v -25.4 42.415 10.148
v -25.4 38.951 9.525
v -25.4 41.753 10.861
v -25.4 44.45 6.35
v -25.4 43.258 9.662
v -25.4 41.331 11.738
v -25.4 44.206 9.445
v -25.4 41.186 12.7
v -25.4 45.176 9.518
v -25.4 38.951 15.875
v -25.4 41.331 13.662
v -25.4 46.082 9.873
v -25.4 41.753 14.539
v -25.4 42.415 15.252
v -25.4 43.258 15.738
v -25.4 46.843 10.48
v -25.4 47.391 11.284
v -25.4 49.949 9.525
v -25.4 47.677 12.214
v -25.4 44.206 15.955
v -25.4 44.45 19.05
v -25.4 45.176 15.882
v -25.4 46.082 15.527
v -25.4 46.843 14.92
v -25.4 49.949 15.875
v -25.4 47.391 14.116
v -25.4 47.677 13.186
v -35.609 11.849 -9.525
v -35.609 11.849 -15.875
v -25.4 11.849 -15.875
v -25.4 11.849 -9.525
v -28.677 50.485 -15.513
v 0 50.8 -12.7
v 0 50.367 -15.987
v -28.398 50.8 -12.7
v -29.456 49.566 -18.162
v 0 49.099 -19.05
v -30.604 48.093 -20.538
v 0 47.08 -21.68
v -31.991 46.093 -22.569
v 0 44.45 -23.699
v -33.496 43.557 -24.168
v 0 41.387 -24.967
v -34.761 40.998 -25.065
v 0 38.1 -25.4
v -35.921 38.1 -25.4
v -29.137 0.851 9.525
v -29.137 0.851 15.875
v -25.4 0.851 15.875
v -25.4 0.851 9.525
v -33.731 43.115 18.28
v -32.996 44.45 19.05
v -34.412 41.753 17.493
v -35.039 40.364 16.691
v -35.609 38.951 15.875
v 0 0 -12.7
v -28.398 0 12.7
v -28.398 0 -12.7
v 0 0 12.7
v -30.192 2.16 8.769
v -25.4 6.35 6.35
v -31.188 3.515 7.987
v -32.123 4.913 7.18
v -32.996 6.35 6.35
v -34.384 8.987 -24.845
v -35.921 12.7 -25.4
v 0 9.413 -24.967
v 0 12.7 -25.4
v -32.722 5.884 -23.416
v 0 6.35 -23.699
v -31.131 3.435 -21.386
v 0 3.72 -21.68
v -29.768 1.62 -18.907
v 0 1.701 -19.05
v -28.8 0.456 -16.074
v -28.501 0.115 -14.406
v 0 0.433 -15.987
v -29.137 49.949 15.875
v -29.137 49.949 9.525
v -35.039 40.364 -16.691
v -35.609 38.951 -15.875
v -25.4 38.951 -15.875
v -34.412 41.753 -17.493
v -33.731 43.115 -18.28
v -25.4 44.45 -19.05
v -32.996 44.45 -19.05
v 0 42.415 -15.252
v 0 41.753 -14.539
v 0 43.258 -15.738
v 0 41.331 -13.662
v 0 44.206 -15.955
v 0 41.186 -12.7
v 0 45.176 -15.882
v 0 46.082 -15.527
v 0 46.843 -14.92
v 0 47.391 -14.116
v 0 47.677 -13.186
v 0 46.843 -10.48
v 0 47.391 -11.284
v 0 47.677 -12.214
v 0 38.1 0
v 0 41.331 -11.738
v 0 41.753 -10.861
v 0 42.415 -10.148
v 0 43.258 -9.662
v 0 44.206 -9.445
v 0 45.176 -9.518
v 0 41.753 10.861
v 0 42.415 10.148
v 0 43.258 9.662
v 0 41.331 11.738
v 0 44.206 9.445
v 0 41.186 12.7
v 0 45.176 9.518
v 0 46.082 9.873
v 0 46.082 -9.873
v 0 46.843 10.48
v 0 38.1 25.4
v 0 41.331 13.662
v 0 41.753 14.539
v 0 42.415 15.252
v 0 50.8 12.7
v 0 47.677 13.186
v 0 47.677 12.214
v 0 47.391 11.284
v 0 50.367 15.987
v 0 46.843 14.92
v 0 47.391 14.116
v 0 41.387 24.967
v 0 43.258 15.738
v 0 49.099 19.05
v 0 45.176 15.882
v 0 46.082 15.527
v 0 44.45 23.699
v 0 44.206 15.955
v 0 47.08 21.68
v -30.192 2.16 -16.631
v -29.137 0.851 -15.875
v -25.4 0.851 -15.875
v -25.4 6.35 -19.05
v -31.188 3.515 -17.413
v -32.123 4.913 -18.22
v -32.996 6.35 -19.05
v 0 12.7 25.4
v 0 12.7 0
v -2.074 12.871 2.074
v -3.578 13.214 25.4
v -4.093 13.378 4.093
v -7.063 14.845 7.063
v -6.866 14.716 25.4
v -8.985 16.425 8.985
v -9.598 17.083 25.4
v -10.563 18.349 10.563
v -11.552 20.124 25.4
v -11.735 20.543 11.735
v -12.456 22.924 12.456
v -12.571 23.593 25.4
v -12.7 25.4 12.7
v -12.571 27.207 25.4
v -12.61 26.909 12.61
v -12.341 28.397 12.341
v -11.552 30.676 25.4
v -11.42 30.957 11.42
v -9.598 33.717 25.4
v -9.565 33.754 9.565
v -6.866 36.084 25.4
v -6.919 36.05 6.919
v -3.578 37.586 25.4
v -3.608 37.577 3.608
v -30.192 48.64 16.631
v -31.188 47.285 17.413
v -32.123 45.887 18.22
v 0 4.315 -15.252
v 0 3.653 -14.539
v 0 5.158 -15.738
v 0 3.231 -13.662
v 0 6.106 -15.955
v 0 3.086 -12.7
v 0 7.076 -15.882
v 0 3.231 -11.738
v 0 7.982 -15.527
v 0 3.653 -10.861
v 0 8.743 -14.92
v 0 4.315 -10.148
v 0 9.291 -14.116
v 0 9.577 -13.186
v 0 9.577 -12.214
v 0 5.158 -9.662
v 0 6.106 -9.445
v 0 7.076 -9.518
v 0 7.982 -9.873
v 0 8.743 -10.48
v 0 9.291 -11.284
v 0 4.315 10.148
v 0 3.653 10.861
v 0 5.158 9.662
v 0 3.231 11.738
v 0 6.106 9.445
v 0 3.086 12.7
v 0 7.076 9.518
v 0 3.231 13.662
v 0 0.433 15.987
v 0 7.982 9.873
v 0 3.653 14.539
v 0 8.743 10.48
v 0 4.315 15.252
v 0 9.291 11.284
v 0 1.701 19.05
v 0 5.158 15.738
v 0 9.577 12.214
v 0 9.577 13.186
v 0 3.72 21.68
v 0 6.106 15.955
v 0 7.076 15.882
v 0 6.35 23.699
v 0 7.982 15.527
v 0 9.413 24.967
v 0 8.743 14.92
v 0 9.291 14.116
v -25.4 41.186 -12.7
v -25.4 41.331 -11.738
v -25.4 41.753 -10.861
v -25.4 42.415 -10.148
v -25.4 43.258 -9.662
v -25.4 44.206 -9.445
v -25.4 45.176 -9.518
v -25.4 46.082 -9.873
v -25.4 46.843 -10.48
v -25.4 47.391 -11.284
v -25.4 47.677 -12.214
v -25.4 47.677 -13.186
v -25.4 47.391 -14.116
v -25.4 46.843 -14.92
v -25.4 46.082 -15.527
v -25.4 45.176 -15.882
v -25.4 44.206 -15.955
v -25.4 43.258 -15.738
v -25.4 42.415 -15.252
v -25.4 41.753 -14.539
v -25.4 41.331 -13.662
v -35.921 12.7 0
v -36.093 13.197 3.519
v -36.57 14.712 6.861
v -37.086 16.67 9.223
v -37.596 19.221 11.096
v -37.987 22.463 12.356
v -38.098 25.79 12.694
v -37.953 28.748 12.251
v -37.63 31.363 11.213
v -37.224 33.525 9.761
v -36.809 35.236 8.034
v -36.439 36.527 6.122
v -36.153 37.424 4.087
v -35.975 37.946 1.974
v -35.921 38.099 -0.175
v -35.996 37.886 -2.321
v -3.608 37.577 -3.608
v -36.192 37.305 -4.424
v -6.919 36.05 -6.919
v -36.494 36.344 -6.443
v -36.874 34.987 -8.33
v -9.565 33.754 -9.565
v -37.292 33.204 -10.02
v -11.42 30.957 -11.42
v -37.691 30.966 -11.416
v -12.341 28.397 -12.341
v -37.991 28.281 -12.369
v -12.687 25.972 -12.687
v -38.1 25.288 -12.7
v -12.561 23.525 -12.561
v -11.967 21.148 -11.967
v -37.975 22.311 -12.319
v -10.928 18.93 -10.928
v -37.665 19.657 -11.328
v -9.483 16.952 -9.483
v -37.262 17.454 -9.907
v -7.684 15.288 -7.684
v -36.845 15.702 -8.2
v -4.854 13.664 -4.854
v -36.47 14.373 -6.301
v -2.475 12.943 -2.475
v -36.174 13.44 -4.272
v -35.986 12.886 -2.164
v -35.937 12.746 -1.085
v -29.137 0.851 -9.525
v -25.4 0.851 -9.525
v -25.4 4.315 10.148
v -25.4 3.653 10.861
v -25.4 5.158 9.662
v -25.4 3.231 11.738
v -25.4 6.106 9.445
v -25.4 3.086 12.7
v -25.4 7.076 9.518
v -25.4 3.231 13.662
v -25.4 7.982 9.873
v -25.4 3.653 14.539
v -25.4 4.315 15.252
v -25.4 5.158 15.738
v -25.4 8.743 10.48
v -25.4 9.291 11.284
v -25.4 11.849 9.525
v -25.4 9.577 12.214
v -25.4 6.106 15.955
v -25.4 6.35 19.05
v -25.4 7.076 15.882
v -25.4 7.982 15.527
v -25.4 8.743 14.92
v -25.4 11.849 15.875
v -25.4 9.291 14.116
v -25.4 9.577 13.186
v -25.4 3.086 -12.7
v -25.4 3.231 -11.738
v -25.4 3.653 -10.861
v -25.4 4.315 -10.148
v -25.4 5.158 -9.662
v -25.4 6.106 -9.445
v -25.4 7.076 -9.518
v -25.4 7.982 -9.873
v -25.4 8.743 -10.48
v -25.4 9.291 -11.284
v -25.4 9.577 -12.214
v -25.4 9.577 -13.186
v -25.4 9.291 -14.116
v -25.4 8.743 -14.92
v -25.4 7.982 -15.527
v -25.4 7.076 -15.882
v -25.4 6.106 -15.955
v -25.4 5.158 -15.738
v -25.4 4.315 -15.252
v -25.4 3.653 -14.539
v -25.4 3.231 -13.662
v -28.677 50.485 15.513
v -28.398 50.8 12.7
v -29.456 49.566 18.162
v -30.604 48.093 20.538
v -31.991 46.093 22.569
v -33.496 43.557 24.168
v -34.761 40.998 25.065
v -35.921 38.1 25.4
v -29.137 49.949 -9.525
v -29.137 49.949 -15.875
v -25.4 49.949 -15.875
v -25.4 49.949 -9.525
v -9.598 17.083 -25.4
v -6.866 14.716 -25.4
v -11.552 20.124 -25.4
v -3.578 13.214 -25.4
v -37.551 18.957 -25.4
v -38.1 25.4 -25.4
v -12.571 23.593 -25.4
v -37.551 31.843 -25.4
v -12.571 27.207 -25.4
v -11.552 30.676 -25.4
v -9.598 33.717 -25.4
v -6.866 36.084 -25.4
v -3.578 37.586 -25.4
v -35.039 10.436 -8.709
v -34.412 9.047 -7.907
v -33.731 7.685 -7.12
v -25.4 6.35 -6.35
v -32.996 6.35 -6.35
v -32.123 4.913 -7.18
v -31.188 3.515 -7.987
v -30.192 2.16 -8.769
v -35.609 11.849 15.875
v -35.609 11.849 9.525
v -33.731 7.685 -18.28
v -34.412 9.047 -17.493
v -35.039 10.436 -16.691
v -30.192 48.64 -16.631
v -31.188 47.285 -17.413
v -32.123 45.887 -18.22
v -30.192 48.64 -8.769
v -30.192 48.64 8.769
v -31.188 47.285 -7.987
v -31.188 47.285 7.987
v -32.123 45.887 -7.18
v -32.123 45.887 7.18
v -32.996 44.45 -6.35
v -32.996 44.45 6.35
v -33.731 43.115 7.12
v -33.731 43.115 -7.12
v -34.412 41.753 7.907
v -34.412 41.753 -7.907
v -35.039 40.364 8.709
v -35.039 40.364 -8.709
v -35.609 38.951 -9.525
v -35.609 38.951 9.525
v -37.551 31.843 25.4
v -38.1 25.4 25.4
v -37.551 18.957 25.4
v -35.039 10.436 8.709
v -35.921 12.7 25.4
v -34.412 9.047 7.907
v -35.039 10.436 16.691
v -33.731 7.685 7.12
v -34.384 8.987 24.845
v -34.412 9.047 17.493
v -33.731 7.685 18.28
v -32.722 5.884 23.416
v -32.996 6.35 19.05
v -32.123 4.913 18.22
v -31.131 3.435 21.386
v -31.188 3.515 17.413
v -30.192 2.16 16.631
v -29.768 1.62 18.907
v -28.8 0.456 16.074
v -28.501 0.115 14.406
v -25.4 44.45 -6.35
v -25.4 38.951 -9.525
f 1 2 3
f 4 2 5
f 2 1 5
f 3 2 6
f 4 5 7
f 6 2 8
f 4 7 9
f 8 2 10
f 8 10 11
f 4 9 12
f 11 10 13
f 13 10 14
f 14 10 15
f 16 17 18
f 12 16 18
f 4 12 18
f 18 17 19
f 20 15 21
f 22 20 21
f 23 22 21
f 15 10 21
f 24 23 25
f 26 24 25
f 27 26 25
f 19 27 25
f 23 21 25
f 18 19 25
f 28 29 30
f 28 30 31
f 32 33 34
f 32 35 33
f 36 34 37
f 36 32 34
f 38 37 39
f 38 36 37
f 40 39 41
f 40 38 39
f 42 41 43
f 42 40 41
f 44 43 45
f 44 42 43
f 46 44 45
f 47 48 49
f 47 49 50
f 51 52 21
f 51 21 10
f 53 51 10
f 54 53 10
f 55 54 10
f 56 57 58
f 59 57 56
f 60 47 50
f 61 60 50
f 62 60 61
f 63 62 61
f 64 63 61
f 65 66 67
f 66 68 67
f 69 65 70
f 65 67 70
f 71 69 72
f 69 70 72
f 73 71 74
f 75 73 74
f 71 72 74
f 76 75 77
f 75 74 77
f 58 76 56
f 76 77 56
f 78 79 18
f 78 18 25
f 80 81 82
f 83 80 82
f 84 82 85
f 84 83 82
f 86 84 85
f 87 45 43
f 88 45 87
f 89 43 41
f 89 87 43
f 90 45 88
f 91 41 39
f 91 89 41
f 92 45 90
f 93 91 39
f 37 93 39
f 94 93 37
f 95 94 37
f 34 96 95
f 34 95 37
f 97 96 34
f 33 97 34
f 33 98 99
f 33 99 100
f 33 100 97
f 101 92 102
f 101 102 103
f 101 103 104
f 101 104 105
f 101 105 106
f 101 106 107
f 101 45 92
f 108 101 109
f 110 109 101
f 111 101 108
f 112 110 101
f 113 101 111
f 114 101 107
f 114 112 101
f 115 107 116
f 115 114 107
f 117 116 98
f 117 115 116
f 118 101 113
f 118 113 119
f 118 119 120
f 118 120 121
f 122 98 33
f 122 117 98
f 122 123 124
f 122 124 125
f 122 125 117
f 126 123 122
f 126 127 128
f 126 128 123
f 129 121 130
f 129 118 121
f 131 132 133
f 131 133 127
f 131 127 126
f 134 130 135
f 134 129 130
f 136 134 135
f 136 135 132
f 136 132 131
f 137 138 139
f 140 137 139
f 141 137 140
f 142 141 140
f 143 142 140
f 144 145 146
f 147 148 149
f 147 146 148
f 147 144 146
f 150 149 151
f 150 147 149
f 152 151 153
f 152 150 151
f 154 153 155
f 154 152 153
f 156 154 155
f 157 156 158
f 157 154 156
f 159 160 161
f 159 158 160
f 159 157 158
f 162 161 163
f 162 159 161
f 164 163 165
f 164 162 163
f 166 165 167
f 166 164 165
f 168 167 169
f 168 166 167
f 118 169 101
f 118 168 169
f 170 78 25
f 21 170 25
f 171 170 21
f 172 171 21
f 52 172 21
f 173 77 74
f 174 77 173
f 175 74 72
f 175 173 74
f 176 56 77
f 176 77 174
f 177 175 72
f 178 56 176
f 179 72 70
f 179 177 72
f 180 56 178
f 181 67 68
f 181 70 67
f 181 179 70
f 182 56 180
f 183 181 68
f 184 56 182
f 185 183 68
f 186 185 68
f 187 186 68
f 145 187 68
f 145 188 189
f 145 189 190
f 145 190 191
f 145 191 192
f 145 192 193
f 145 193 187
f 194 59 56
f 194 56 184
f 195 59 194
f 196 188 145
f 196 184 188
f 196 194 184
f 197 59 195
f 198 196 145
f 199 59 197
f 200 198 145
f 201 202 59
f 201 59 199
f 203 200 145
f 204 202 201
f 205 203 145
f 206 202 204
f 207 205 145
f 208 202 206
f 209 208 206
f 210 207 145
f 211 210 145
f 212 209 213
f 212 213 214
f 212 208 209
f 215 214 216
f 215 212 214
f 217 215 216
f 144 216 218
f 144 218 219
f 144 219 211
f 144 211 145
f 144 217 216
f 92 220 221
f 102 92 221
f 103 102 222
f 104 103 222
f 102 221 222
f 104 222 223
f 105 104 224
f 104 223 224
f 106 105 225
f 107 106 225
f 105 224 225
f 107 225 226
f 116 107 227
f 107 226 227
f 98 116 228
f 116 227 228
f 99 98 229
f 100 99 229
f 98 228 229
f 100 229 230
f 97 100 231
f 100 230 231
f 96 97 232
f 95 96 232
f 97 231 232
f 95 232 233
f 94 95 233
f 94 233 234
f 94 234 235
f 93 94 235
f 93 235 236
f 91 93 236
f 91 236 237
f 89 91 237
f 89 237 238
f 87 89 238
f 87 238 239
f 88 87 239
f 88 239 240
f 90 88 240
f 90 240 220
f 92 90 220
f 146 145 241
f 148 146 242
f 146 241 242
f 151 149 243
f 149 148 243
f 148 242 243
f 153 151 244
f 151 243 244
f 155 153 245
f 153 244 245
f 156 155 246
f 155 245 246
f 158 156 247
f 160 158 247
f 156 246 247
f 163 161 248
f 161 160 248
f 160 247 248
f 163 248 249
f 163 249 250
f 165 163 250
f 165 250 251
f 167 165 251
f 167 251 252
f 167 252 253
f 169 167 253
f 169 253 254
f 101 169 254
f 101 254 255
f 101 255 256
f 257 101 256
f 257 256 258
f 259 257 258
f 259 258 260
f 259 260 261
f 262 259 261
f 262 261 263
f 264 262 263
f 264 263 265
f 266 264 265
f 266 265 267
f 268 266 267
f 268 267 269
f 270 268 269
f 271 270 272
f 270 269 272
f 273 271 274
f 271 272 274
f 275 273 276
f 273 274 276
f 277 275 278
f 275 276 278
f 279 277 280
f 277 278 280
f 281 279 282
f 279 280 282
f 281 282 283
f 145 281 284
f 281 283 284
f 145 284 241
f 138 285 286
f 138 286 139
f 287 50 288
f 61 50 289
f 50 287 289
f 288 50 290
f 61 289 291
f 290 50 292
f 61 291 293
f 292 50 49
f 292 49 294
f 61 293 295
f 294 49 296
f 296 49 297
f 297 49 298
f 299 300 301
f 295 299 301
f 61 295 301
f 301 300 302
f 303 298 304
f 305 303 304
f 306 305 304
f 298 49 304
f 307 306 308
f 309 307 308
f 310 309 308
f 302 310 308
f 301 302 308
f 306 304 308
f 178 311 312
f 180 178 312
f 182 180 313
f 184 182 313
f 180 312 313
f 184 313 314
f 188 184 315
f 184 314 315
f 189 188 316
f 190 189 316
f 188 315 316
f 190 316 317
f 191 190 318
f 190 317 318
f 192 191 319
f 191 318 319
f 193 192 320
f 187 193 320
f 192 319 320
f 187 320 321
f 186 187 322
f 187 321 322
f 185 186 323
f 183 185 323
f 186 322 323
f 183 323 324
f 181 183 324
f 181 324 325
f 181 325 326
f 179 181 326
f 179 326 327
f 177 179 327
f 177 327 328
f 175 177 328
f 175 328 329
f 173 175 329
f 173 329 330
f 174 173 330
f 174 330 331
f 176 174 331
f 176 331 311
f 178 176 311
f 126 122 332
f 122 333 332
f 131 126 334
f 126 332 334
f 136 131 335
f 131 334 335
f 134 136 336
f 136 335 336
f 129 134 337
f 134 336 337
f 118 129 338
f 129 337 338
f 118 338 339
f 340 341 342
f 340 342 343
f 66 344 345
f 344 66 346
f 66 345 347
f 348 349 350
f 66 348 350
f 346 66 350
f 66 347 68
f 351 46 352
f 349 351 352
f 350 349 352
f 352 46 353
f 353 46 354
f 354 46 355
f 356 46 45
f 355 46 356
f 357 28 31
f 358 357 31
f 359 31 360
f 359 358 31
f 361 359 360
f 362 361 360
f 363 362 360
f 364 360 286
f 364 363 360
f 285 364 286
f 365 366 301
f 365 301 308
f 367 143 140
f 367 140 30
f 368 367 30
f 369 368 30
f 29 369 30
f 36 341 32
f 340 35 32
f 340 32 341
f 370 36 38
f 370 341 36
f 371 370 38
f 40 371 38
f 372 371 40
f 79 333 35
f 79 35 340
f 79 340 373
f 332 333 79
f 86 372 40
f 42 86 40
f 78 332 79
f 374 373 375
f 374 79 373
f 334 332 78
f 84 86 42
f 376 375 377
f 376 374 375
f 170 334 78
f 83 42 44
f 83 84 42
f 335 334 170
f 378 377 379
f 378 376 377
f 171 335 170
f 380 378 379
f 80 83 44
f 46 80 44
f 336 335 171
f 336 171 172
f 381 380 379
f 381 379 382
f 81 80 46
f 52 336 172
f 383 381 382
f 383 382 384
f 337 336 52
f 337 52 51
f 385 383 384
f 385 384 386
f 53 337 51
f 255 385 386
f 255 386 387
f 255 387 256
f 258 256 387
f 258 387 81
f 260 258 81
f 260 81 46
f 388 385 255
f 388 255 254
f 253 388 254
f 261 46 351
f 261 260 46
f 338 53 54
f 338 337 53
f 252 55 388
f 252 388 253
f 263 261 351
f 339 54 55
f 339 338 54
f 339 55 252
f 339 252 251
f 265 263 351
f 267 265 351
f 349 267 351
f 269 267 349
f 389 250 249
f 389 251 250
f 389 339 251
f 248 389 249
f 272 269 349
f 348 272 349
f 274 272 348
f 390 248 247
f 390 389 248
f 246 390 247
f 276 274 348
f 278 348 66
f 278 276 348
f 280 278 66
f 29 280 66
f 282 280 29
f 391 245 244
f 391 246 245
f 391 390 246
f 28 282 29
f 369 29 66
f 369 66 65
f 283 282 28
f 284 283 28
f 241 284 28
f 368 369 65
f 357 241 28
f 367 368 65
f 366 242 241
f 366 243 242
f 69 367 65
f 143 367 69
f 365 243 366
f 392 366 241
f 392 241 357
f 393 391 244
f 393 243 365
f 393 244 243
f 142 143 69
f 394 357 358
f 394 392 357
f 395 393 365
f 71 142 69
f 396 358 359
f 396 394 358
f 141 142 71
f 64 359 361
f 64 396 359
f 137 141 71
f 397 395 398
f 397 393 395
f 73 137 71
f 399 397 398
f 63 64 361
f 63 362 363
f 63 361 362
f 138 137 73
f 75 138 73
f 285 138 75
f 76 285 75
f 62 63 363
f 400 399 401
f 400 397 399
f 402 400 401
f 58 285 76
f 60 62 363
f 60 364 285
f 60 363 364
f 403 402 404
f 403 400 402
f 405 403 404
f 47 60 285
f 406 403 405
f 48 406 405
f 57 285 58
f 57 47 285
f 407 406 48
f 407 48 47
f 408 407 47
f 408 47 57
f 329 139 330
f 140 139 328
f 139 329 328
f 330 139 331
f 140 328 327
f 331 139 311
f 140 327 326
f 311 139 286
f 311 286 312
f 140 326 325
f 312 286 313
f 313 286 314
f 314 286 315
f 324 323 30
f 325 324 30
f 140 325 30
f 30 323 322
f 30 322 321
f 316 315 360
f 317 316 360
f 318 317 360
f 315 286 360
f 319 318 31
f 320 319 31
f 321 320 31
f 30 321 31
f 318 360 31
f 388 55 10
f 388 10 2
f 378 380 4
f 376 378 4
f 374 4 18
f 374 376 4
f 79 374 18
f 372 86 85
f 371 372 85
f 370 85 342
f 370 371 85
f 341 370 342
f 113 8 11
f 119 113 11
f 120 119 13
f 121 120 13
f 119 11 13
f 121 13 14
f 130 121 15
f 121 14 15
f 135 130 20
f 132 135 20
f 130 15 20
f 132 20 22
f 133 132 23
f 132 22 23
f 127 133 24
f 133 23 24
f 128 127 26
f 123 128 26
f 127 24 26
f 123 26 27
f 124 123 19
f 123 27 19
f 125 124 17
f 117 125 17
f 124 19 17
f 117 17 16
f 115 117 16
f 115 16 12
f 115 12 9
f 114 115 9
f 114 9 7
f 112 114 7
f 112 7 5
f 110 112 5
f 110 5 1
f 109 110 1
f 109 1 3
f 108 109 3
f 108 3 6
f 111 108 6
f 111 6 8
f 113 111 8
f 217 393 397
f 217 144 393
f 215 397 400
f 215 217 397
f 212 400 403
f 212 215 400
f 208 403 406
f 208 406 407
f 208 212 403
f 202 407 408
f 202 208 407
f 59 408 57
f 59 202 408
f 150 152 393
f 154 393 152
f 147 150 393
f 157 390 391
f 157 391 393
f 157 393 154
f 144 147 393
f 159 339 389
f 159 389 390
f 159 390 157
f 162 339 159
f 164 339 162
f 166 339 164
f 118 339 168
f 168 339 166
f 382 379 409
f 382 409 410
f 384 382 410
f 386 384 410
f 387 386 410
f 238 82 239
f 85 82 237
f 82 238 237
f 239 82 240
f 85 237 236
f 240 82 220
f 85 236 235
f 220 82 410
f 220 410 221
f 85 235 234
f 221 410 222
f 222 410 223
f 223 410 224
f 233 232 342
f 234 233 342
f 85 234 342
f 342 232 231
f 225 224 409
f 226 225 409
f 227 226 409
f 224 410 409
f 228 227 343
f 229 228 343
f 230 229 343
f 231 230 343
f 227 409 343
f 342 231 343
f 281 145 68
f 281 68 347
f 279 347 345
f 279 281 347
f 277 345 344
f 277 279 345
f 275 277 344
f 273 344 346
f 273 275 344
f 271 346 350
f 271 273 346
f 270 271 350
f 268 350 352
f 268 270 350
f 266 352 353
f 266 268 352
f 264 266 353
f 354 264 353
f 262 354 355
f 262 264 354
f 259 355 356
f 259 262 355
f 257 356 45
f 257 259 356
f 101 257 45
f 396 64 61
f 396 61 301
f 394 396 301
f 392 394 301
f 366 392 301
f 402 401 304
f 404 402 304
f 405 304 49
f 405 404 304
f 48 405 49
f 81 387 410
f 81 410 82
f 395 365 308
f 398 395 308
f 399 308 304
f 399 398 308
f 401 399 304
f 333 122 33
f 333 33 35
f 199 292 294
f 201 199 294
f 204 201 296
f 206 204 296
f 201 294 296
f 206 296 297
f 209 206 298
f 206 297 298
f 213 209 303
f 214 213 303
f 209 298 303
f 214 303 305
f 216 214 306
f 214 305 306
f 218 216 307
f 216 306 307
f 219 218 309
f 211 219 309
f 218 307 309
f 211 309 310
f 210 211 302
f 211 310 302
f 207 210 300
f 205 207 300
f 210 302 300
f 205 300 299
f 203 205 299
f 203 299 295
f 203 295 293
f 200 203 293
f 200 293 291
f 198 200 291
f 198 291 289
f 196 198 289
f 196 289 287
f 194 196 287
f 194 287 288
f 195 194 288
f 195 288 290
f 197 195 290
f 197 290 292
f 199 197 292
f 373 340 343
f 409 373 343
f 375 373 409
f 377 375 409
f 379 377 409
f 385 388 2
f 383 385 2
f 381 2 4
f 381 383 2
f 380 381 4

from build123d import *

# Parameters (mm, degrees)
F1_DEPTH = 25.4
F3_D     = 6.5278
F7_DEPTH = 12.7
F8_R     = 12.7
F9_D     = 25.4


with BuildPart() as f1:
    # F0 (on Top) → F1 (new body, symmetric)
    with BuildSketch(Plane.XY):
        with BuildLine():
            Line((0, 50.8), (-28.3980633142, 50.8))
            ThreePointArc((-28.3980633142, 50.8), (-38.1, 25.4), (-28.3980633142, 0))
            Line((-28.3980633142, 0), (0, 0))
            Line((0, 0), (0, 12.7))
            ThreePointArc((0, 12.7), (-12.7, 25.4), (0, 38.1))
            Line((0, 38.1), (0, 50.8))
        make_face()
    extrude(amount=F1_DEPTH, both=True)

    # F3 (through all)
    with Locations(Plane.YZ):
        with Locations((6.35, 12.7), (44.45, 12.7), (44.45, -12.7), (6.35, -12.7)):
            Hole(F3_D / 2)

    # F6 (on plane+point) → F7 (cut)
    with BuildSketch(Plane.YZ.offset(-38.1)):
        Polygon((0.850738686, 15.875), (0.850738686, 9.525), (6.35, 6.35), (11.849261314, 9.525), (11.849261314, 15.875), (6.35, 19.05), align=None)
        Polygon((38.950738686, 15.875), (38.950738686, 9.525), (44.45, 6.35), (49.949261314, 9.525), (49.949261314, 15.875), (44.45, 19.05), align=None)
        Polygon((44.45, -6.35), (38.950738686, -9.525), (38.950738686, -15.875), (44.45, -19.05), (49.949261314, -15.875), (49.949261314, -9.525), align=None)
        Polygon((6.35, -6.35), (0.850738686, -9.525), (0.850738686, -15.875), (6.35, -19.05), (11.849261314, -15.875), (11.849261314, -9.525), align=None)
    extrude(amount=F7_DEPTH, mode=Mode.SUBTRACT)

    # F8
    f8_edges = [f1.edges().sort_by_distance(p)[0] for p in [
        (-14.199032, 0, 25.4),
        (-14.199032, 50.8, 25.4),
        (-14.199032, 0, -25.4),
        (-14.199032, 50.8, -25.4),
    ]]
    fillet(f8_edges, radius=F8_R)

    # F9 (through all)
    with Locations(Plane.YZ):
        with Locations((25.4, 0)):
            Hole(F9_D / 2)


solid = f1.part
